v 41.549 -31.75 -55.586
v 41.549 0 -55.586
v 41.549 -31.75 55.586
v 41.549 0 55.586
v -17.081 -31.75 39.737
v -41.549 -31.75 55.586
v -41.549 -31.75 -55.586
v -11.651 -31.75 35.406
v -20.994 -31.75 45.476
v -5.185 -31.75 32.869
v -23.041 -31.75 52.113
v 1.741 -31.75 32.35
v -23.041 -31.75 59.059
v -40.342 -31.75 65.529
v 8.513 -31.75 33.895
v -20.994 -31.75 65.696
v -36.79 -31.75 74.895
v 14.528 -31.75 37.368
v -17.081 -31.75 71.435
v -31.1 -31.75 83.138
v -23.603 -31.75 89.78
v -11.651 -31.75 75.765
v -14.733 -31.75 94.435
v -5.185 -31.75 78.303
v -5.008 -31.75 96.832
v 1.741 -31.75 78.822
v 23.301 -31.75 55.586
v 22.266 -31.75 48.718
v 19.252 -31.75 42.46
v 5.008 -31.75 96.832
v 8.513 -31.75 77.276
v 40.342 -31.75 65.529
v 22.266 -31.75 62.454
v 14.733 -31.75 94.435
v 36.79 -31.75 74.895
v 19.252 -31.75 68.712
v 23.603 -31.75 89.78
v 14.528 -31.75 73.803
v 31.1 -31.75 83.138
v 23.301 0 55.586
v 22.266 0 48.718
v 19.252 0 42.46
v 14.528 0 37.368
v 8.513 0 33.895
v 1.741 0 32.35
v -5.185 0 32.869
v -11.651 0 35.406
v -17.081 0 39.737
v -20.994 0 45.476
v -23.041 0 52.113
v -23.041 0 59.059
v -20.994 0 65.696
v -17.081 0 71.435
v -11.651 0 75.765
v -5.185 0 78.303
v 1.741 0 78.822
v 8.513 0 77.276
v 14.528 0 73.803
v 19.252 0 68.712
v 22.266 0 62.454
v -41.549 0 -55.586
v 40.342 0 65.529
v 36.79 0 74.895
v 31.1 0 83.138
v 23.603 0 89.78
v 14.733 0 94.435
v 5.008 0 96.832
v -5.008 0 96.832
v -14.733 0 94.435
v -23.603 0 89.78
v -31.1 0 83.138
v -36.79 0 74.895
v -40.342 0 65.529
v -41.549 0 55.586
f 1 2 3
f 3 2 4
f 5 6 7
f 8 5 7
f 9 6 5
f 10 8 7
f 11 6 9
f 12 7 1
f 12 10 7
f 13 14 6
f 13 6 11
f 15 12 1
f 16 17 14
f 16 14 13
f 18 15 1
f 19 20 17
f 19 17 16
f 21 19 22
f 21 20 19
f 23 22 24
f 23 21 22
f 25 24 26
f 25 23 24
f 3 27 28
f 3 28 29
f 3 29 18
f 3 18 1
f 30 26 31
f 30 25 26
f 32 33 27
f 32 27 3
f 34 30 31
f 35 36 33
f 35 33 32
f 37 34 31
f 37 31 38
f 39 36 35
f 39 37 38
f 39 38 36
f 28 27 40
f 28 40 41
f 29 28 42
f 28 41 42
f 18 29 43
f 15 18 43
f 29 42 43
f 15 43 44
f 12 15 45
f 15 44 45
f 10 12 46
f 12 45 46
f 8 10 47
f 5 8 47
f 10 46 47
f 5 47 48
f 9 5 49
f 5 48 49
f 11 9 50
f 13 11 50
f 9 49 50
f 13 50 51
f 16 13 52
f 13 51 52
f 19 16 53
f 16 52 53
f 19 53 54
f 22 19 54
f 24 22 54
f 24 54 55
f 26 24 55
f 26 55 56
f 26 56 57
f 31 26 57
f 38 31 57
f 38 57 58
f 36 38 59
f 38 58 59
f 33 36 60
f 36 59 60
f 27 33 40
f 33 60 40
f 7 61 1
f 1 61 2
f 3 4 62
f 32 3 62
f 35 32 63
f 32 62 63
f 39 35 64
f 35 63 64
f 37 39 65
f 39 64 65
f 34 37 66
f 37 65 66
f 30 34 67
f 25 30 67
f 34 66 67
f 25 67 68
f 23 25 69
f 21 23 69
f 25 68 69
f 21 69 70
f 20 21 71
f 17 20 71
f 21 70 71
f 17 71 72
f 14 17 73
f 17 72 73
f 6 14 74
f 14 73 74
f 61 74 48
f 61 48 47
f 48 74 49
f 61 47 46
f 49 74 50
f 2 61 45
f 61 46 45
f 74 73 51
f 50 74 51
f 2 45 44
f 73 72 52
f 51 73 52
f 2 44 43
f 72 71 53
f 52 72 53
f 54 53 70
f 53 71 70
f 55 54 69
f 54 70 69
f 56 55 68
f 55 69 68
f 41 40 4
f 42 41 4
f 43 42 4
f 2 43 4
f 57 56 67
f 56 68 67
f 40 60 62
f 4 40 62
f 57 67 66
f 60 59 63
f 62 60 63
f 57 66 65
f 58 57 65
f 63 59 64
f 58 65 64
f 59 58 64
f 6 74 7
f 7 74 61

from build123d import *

# Parameters (mm, degrees)
F1_DEPTH = 31.75


with BuildPart() as f1:
    # F0 (on Front) → F1 (new body)
    with BuildSketch(Plane.XZ):
        with BuildLine():
            Line((-41.549053, -55.585895), (41.549053, -55.585895))
            Line((41.549053, -55.585895), (41.549053, 55.585895))
            ThreePointArc((41.549053, 55.585895), (0, 97.134948), (-41.549053, 55.585895))
            Line((-41.549053, 55.585895), (-41.549053, -55.585895))
        make_face()
        with BuildLine():
            ThreePointArc((-23.30116, 55.585895), (0, 78.887055), (23.30116, 55.585895))
            ThreePointArc((23.30116, 55.585895), (0, 32.284735), (-23.30116, 55.585895))
        make_face(mode=Mode.SUBTRACT)
    extrude(amount=F1_DEPTH)


solid = f1.part
